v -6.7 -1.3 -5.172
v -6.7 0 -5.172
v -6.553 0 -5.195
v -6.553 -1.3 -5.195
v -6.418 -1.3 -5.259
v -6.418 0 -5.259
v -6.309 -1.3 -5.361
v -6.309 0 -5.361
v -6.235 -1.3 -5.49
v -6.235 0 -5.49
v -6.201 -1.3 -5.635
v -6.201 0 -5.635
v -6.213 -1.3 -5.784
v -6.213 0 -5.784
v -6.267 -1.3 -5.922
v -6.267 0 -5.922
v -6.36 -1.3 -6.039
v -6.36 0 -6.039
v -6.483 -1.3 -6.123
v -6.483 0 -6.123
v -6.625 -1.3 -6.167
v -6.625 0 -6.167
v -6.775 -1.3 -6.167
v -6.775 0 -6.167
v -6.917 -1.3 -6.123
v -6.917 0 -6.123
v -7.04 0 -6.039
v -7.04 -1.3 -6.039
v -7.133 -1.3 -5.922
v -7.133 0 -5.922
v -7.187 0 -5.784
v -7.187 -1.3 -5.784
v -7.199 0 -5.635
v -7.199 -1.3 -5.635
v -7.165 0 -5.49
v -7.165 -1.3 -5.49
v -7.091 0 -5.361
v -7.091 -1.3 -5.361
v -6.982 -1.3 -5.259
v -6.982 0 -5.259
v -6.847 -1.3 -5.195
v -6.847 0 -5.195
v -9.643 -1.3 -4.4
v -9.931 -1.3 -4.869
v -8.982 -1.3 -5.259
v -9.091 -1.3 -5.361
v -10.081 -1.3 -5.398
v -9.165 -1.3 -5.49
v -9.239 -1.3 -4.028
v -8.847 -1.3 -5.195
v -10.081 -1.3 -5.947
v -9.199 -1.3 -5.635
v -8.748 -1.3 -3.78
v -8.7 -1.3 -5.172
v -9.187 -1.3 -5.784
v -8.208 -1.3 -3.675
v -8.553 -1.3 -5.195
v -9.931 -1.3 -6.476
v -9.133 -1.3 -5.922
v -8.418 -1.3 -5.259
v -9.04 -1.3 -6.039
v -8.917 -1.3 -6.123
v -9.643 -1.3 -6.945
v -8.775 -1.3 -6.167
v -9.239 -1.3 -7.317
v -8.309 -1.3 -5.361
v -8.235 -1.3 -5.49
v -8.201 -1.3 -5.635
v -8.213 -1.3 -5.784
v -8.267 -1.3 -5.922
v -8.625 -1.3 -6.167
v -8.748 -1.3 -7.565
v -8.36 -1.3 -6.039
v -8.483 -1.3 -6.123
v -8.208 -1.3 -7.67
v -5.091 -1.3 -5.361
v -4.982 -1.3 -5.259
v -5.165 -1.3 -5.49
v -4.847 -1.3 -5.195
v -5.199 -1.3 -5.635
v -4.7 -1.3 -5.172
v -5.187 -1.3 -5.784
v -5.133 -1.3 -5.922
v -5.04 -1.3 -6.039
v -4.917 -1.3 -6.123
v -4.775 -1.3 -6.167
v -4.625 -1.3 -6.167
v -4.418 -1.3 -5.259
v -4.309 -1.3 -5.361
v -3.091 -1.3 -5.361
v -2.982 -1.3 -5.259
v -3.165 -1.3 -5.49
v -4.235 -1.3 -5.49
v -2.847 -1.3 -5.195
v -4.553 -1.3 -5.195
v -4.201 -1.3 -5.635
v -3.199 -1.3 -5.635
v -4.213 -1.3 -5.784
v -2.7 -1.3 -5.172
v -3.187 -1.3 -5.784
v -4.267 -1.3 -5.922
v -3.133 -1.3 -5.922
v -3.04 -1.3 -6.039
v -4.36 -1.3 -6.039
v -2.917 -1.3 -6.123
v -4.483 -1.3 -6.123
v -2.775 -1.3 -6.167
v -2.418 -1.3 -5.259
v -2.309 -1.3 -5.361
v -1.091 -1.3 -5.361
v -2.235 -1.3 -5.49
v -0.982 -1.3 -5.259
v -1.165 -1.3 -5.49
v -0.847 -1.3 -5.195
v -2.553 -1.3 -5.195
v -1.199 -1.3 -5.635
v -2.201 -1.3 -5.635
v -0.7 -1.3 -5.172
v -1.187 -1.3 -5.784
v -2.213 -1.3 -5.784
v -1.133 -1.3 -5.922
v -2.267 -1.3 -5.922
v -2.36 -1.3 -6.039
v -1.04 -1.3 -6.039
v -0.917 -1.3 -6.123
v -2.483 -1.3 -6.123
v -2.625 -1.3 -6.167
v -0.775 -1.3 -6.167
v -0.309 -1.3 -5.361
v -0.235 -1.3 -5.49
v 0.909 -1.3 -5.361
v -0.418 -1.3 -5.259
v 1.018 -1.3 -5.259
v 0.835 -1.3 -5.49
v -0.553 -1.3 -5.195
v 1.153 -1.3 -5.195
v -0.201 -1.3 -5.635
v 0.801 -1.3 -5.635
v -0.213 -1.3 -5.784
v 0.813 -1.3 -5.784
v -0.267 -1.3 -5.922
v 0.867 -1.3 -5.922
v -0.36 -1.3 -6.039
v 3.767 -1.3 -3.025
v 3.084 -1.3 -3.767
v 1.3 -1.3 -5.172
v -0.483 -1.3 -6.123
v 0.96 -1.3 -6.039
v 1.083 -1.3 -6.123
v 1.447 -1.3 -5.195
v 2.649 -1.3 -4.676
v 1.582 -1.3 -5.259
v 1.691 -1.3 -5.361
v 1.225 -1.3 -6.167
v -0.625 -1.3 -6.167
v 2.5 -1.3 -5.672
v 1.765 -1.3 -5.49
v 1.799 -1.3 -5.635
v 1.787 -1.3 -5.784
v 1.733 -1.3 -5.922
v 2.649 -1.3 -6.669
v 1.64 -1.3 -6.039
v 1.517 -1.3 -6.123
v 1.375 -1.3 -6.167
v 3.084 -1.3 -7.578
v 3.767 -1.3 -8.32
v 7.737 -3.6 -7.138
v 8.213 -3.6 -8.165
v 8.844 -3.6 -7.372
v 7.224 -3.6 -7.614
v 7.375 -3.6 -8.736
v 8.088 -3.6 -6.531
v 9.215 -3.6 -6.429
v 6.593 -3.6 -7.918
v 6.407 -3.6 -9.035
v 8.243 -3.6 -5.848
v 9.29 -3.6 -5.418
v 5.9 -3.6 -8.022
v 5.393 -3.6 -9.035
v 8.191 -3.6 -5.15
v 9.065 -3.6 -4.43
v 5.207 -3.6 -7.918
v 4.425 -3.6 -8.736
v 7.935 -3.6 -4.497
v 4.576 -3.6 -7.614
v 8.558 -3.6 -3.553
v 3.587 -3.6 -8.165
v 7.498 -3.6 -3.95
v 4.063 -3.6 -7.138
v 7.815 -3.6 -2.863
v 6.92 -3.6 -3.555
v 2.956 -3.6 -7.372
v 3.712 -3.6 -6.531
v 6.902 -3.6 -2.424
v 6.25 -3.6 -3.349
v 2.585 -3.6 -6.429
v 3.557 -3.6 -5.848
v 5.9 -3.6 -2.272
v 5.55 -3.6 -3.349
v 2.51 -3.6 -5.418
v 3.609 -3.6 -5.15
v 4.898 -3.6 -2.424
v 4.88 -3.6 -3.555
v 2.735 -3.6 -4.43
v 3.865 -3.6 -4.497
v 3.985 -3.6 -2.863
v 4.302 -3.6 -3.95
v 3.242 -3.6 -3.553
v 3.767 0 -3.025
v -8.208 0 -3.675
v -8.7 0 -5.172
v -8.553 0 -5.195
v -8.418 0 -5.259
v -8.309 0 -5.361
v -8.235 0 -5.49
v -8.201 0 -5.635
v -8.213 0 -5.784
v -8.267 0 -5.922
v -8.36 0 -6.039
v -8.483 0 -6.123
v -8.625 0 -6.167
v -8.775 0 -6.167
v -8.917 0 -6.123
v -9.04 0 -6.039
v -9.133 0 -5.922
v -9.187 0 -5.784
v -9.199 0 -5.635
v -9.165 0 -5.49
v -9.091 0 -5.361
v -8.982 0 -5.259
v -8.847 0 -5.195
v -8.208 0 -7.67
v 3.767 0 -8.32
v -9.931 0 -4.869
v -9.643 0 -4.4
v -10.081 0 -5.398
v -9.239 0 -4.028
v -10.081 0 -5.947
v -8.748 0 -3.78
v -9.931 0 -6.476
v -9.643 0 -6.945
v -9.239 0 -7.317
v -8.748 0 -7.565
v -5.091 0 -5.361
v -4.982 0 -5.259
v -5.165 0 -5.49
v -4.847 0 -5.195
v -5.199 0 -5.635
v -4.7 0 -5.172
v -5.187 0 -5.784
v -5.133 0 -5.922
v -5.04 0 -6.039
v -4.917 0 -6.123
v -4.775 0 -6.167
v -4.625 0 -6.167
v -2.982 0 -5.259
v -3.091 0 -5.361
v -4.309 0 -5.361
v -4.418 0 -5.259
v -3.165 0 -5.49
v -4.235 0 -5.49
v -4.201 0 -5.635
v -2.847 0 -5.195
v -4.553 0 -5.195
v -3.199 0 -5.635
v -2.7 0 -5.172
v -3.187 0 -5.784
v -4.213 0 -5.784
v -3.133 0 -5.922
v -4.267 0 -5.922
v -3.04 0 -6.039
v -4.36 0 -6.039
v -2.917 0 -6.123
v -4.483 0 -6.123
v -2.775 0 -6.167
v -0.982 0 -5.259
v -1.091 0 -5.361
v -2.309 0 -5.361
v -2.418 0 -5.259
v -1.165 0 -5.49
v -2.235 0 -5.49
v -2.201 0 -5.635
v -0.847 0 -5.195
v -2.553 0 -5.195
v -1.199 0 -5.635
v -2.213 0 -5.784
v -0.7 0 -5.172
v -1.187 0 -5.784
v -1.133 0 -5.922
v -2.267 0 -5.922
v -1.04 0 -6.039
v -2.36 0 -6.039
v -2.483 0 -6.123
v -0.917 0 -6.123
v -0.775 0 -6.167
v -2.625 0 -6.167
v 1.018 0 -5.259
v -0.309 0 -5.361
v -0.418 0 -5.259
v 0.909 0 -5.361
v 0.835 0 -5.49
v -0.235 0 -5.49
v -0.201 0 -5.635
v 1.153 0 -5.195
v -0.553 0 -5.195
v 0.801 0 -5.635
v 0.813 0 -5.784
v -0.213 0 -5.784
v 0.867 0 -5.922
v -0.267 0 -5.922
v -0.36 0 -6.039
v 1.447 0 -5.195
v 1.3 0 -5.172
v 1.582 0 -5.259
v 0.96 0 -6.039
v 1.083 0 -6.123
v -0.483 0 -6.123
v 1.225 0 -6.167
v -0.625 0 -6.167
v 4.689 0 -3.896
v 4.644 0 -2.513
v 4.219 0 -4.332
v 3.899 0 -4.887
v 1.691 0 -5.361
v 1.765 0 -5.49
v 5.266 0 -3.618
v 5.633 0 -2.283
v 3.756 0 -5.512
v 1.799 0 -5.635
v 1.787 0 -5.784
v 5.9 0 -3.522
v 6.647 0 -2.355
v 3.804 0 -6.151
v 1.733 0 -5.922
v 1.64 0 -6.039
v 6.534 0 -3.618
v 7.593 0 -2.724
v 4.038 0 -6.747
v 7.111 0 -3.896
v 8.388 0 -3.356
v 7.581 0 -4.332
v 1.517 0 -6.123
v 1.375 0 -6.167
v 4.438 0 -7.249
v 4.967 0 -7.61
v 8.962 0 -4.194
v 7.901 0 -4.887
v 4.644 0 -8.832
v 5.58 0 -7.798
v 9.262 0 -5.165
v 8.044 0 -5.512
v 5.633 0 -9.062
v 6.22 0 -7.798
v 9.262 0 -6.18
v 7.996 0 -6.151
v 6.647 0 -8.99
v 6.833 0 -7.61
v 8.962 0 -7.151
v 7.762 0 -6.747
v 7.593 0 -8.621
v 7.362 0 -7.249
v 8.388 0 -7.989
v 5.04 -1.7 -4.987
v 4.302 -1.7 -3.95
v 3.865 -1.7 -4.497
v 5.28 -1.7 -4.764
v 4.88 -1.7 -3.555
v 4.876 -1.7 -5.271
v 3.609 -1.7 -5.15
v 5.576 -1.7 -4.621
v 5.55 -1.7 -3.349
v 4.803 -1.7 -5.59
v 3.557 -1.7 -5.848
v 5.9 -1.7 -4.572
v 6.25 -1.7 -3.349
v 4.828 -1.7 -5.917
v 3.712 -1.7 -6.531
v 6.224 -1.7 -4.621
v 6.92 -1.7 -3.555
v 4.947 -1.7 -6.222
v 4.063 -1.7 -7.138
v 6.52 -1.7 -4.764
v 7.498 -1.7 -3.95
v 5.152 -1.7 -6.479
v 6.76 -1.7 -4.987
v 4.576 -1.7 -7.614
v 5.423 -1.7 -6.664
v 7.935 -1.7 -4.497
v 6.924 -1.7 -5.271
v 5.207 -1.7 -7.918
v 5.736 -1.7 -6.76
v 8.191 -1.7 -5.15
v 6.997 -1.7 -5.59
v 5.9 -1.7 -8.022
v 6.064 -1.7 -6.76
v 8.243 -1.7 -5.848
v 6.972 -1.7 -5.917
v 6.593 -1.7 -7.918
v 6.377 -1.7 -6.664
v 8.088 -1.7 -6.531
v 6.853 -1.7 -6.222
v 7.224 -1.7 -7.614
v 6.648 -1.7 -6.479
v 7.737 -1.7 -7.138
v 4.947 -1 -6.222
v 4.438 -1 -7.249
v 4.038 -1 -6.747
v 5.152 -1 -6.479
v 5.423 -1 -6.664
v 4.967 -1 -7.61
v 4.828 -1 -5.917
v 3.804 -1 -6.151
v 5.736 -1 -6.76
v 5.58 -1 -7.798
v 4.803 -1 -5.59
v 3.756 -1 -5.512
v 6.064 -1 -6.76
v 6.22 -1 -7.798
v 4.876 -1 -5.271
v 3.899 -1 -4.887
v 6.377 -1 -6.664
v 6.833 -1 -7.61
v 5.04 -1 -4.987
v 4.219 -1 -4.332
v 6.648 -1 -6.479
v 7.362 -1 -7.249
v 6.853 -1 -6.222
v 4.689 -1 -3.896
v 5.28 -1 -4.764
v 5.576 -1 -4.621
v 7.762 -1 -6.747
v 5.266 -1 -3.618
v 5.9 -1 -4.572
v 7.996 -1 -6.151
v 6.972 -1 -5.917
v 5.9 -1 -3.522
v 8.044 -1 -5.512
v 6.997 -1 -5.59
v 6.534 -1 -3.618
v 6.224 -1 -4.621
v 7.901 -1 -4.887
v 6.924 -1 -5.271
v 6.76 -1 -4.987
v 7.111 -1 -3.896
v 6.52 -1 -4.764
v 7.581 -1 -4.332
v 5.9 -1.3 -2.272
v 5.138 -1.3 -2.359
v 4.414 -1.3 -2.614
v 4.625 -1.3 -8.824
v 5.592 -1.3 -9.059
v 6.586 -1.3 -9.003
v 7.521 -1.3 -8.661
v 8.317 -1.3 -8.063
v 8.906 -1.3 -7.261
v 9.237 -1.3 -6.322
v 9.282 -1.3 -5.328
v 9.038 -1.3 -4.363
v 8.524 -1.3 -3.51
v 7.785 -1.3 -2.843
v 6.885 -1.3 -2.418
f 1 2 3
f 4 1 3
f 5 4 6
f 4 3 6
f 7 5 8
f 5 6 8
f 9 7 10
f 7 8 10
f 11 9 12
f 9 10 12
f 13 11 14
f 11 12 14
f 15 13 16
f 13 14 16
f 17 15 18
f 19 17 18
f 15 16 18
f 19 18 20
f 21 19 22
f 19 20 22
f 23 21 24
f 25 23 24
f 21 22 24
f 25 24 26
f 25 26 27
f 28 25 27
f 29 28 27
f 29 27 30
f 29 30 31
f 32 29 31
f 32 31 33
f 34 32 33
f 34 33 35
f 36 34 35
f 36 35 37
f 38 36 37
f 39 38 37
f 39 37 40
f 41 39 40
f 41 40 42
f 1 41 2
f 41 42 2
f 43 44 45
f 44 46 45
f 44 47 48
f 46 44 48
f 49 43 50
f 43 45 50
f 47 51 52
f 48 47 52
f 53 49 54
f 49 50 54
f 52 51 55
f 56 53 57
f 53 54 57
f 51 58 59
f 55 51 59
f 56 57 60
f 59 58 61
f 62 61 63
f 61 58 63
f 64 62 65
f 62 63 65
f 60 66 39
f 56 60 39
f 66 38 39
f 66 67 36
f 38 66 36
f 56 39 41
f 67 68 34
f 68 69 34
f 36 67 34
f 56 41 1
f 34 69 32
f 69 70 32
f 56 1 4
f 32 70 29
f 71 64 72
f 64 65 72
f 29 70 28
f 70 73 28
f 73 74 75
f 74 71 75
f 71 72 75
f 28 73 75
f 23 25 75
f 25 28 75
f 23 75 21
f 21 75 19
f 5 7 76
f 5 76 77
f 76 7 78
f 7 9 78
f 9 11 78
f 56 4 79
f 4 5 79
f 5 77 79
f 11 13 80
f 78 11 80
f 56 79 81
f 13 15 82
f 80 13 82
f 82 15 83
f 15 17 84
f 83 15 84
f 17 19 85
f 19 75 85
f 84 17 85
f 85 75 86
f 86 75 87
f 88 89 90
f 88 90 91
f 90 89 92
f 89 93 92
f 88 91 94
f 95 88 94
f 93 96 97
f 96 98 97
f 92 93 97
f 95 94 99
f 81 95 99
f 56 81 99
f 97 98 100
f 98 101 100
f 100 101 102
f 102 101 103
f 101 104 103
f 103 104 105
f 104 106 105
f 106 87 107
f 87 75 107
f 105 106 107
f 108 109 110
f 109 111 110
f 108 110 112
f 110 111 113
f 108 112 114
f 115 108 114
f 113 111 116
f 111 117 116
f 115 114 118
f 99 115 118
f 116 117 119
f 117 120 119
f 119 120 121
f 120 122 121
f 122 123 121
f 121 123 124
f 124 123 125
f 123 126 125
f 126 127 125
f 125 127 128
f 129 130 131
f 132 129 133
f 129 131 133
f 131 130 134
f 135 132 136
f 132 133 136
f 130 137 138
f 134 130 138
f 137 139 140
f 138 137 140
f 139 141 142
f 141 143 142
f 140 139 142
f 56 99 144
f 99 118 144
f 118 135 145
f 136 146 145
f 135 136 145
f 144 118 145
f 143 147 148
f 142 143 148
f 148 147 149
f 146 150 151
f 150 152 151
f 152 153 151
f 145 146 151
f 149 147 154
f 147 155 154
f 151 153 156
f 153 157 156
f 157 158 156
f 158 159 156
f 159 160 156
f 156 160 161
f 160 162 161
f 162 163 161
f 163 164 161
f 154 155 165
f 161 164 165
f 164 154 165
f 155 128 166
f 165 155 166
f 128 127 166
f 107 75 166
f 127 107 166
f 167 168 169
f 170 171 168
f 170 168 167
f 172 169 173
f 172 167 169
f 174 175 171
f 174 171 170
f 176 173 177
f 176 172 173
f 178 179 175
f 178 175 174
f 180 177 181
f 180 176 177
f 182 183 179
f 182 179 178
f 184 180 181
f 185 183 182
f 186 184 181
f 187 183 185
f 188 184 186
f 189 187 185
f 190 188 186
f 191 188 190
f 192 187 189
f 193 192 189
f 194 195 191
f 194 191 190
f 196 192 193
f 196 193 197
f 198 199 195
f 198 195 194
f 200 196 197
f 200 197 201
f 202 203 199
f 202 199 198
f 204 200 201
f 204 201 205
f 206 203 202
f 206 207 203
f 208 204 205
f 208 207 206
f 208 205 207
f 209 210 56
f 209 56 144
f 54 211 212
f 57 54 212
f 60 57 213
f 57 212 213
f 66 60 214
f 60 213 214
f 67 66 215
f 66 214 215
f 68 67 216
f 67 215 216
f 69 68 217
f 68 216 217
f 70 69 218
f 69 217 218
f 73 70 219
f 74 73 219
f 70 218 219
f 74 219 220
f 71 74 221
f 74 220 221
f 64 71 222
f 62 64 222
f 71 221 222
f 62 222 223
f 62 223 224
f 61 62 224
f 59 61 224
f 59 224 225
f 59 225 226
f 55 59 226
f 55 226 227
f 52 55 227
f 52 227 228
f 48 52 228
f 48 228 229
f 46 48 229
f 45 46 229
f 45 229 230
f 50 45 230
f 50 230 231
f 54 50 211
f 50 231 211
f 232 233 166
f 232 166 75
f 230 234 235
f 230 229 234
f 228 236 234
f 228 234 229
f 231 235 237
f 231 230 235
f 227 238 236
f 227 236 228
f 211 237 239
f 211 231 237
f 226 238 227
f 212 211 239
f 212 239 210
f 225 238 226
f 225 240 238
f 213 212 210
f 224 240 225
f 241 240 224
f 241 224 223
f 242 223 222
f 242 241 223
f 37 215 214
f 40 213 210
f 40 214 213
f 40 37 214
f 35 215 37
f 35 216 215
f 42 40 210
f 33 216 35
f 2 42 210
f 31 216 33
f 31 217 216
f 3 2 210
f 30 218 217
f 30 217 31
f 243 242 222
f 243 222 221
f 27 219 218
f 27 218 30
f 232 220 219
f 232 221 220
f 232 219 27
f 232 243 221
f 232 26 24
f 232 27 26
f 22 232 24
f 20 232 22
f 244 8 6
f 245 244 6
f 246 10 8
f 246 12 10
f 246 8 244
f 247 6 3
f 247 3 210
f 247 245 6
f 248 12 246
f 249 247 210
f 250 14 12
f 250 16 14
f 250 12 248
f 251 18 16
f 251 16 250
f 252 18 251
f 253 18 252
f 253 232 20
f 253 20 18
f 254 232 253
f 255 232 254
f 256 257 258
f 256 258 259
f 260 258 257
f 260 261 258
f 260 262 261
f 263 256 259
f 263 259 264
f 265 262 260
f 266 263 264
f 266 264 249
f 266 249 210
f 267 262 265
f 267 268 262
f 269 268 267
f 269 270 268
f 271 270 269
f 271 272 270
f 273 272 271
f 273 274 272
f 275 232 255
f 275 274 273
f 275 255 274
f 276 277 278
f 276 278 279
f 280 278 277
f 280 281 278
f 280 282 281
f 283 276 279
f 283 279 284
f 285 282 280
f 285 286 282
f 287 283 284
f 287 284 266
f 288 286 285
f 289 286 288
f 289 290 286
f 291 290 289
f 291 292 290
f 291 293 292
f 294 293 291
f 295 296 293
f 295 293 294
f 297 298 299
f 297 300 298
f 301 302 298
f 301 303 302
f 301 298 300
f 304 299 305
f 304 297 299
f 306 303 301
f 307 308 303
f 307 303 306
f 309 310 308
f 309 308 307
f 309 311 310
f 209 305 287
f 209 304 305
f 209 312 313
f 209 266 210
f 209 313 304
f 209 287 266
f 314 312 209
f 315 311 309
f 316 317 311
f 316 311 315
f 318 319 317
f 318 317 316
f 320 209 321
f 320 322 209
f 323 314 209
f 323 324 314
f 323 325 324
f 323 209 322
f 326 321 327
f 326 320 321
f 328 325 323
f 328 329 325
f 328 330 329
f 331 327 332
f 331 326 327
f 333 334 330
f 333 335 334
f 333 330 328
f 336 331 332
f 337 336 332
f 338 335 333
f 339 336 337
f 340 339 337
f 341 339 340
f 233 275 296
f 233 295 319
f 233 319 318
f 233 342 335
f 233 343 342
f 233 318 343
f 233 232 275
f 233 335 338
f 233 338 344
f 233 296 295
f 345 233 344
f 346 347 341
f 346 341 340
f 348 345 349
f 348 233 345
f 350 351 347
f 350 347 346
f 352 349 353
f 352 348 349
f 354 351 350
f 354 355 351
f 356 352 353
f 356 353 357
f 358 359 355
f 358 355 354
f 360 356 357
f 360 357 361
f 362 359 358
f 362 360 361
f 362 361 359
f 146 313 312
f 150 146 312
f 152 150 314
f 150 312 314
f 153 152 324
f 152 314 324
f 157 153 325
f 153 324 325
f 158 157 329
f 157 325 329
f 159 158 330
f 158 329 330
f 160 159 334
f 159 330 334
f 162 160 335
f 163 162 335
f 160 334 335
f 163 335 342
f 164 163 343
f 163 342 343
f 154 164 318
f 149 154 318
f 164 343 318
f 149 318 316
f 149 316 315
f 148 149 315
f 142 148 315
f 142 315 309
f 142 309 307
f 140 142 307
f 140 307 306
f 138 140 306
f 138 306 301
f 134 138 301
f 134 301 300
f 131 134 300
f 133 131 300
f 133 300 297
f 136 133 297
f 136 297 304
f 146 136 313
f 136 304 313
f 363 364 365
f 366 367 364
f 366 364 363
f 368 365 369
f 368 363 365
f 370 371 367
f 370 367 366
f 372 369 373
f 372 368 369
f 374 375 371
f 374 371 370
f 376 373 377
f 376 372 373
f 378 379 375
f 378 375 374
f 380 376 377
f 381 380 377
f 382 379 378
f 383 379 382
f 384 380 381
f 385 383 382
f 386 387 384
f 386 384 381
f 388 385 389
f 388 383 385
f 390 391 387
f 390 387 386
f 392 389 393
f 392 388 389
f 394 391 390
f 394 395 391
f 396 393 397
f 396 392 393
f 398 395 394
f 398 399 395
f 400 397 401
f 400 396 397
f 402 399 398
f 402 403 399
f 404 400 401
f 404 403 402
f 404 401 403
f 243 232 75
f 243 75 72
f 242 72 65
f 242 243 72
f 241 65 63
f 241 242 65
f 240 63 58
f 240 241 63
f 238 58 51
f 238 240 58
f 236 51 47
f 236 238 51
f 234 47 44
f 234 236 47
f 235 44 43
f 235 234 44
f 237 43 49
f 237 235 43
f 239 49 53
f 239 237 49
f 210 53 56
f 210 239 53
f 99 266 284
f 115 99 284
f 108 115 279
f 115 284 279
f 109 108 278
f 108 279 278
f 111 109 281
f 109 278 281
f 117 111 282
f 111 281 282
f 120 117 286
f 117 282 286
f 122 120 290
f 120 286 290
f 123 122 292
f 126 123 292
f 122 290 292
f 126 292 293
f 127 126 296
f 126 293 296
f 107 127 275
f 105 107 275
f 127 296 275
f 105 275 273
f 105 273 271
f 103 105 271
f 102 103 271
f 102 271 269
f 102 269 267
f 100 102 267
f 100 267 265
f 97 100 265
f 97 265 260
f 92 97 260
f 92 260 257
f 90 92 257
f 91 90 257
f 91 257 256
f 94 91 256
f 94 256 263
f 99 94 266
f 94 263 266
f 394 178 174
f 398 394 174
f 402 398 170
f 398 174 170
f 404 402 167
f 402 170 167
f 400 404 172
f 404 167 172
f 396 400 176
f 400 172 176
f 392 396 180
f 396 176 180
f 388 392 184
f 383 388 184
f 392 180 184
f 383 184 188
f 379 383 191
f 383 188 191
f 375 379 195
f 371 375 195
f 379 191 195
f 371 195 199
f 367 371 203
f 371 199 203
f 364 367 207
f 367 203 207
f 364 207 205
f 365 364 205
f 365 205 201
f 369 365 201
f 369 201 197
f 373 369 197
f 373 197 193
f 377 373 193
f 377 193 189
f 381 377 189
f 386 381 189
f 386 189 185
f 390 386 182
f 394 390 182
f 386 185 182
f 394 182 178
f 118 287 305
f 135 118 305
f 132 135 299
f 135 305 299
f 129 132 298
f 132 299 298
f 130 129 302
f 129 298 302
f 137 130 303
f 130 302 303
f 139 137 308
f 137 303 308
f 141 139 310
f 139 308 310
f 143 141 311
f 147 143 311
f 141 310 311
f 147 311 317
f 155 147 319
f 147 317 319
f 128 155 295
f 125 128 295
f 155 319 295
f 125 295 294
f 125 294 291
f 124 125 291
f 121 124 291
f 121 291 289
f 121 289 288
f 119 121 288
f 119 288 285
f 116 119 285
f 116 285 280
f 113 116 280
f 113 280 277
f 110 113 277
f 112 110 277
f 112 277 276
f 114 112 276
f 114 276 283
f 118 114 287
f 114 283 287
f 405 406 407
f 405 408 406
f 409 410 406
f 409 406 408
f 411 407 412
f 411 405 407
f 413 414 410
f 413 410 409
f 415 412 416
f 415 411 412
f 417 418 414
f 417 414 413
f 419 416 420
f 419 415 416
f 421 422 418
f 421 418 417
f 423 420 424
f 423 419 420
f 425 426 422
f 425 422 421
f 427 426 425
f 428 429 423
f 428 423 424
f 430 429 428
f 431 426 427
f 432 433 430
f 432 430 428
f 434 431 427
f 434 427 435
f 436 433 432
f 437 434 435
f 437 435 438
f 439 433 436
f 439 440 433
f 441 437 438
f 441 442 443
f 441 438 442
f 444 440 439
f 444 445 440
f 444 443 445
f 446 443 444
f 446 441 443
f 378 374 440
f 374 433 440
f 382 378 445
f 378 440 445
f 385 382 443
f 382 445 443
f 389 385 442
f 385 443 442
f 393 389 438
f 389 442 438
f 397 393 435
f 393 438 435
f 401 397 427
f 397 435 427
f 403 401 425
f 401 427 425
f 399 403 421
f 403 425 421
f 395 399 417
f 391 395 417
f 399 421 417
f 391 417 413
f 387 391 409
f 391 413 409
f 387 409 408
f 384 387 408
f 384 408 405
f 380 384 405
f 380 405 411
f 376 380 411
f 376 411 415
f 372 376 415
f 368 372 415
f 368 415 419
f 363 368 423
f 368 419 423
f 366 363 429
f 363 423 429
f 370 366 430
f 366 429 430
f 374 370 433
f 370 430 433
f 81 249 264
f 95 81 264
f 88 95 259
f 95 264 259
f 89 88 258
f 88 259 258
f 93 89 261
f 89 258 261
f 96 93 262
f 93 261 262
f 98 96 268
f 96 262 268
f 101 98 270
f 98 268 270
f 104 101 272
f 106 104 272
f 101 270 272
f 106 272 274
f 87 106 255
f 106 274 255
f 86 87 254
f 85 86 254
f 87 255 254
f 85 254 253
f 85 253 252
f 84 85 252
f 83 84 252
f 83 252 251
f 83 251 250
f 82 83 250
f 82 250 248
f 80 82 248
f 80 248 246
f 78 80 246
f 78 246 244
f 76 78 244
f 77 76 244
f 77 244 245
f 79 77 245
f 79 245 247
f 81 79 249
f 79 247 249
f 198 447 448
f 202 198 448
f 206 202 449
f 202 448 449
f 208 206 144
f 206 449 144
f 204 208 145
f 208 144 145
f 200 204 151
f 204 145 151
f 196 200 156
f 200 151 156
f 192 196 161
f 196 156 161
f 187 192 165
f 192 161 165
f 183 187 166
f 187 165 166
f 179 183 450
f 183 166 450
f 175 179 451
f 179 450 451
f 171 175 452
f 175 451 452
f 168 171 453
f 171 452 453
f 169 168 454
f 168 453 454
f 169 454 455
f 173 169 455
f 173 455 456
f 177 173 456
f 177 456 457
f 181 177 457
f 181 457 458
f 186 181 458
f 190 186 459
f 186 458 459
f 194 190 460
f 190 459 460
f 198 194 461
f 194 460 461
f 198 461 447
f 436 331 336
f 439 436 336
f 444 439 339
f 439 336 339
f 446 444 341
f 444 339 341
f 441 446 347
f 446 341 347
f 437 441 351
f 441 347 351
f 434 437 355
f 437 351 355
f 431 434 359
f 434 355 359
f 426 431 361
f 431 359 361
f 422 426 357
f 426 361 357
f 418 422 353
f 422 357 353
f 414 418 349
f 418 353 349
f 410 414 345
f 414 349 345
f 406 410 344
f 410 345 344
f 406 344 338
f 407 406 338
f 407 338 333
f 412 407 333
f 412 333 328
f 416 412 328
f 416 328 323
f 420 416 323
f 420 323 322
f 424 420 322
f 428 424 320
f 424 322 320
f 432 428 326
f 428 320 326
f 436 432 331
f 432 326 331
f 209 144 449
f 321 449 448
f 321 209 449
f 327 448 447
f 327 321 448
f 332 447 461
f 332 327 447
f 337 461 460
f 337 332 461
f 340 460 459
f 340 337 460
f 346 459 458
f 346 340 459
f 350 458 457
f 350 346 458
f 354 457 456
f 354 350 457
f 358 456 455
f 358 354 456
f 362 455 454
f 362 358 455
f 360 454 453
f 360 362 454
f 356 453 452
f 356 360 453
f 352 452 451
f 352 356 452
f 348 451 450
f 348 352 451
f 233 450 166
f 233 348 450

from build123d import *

# Parameters (mm, degrees)
SKETCH1_R           = 0.5
SKETCH1_R_2         = 1.1
BOSS_EXTRUDE1_DEPTH = 1.3
SKETCH3_R           = 2.15
CUT_EXTRUDE1_DEPTH  = 1
SKETCH4_R           = 3.4
BOSS_EXTRUDE3_DEPTH = 2.3
SKETCH5_R           = 2.35
CUT_EXTRUDE2_DEPTH  = 1.9
CUT_EXTRUDE3_REACH  = 15.77
SKETCH6_R           = 1.1


with BuildPart() as part:
    # Sketch1 → Boss-Extrude1 (new body)
    with BuildSketch(Plane(origin=(0, 0, 0), x_dir=(1, 0, 0), z_dir=(0, 1, 0))):
        with BuildLine():
            Line((3.766745444, 8.319988196), (-8.208470762, 7.669550455))
            ThreePointArc((-8.208470762, 7.669550455), (-10.1, 5.672494098), (-8.208470762, 3.675437741))
            Line((-8.208470762, 3.675437741), (3.766745444, 3.025))
            ThreePointArc((3.766745444, 3.025), (9.3, 5.672494098), (3.766745444, 8.319988196))
        make_face()
        with Locations(Location((-8.7, 5.672494098, 0), (0, 0, 270))):
            Circle(SKETCH1_R, mode=Mode.SUBTRACT)
        with Locations(Location((1.3, 5.672494098, 0), (0, 0, 270))):
            Circle(SKETCH1_R, mode=Mode.SUBTRACT)
        with Locations(Location((-0.7, 5.672494098, 0), (0, 0, 270))):
            Circle(SKETCH1_R, mode=Mode.SUBTRACT)
        with Locations(Location((-2.7, 5.672494098, 0), (0, 0, 270))):
            Circle(SKETCH1_R, mode=Mode.SUBTRACT)
        with Locations(Location((-4.7, 5.672494098, 0), (0, 0, 270))):
            Circle(SKETCH1_R, mode=Mode.SUBTRACT)
        with Locations(Location((-6.7, 5.672494098, 0), (0, 0, 270))):
            Circle(SKETCH1_R, mode=Mode.SUBTRACT)
        with Locations(Location((5.9, 5.672494098, 0), (0, 0, 270))):
            Circle(SKETCH1_R_2, mode=Mode.SUBTRACT)
    extrude(amount=-BOSS_EXTRUDE1_DEPTH)

    # Sketch3 → Cut-Extrude1 (cut)
    with BuildSketch(Plane(origin=(0, 0, 0), x_dir=(1, 0, 0), z_dir=(0, 1, 0))):
        with Locations(Location((5.9, 5.672494098, 0), (0, 0, 270))):
            Circle(SKETCH3_R)
    extrude(amount=-CUT_EXTRUDE1_DEPTH, mode=Mode.SUBTRACT)

    # Sketch4 → Boss-Extrude3 (add)
    with BuildSketch(Plane.XZ.offset(1.3)):
        with Locations(Location((5.9, -5.672494098, 0), (0, 0, 90))):
            Circle(SKETCH4_R)
    extrude(amount=BOSS_EXTRUDE3_DEPTH)

    # Sketch5 → Cut-Extrude2 (cut)
    with BuildSketch(Plane.XZ.offset(3.6)):
        with Locations(Location((5.9, -5.672494098, 0), (0, 0, 270))):
            Circle(SKETCH5_R)
    extrude(amount=-CUT_EXTRUDE2_DEPTH, mode=Mode.SUBTRACT)

    # Sketch6 → Cut-Extrude3 (cut, up to next)
    with BuildSketch(Plane(origin=(0, -1.3, 0), x_dir=(1, 0, 0), z_dir=(0, 1, 0)), mode=Mode.PRIVATE) as cut_extrude3_sk1:
        with Locations(Location((5.9, 5.672494098, 0), (0, 0, 270))):
            Circle(SKETCH6_R)
    cut_extrude3_tool1 = extrude(cut_extrude3_sk1.sketch, amount=-CUT_EXTRUDE3_REACH, mode=Mode.PRIVATE) & part.part
    add(cut_extrude3_tool1.solids().sort_by_distance((5.9, -1.3, -5.672494))[0], mode=Mode.SUBTRACT)


solid = part.part
